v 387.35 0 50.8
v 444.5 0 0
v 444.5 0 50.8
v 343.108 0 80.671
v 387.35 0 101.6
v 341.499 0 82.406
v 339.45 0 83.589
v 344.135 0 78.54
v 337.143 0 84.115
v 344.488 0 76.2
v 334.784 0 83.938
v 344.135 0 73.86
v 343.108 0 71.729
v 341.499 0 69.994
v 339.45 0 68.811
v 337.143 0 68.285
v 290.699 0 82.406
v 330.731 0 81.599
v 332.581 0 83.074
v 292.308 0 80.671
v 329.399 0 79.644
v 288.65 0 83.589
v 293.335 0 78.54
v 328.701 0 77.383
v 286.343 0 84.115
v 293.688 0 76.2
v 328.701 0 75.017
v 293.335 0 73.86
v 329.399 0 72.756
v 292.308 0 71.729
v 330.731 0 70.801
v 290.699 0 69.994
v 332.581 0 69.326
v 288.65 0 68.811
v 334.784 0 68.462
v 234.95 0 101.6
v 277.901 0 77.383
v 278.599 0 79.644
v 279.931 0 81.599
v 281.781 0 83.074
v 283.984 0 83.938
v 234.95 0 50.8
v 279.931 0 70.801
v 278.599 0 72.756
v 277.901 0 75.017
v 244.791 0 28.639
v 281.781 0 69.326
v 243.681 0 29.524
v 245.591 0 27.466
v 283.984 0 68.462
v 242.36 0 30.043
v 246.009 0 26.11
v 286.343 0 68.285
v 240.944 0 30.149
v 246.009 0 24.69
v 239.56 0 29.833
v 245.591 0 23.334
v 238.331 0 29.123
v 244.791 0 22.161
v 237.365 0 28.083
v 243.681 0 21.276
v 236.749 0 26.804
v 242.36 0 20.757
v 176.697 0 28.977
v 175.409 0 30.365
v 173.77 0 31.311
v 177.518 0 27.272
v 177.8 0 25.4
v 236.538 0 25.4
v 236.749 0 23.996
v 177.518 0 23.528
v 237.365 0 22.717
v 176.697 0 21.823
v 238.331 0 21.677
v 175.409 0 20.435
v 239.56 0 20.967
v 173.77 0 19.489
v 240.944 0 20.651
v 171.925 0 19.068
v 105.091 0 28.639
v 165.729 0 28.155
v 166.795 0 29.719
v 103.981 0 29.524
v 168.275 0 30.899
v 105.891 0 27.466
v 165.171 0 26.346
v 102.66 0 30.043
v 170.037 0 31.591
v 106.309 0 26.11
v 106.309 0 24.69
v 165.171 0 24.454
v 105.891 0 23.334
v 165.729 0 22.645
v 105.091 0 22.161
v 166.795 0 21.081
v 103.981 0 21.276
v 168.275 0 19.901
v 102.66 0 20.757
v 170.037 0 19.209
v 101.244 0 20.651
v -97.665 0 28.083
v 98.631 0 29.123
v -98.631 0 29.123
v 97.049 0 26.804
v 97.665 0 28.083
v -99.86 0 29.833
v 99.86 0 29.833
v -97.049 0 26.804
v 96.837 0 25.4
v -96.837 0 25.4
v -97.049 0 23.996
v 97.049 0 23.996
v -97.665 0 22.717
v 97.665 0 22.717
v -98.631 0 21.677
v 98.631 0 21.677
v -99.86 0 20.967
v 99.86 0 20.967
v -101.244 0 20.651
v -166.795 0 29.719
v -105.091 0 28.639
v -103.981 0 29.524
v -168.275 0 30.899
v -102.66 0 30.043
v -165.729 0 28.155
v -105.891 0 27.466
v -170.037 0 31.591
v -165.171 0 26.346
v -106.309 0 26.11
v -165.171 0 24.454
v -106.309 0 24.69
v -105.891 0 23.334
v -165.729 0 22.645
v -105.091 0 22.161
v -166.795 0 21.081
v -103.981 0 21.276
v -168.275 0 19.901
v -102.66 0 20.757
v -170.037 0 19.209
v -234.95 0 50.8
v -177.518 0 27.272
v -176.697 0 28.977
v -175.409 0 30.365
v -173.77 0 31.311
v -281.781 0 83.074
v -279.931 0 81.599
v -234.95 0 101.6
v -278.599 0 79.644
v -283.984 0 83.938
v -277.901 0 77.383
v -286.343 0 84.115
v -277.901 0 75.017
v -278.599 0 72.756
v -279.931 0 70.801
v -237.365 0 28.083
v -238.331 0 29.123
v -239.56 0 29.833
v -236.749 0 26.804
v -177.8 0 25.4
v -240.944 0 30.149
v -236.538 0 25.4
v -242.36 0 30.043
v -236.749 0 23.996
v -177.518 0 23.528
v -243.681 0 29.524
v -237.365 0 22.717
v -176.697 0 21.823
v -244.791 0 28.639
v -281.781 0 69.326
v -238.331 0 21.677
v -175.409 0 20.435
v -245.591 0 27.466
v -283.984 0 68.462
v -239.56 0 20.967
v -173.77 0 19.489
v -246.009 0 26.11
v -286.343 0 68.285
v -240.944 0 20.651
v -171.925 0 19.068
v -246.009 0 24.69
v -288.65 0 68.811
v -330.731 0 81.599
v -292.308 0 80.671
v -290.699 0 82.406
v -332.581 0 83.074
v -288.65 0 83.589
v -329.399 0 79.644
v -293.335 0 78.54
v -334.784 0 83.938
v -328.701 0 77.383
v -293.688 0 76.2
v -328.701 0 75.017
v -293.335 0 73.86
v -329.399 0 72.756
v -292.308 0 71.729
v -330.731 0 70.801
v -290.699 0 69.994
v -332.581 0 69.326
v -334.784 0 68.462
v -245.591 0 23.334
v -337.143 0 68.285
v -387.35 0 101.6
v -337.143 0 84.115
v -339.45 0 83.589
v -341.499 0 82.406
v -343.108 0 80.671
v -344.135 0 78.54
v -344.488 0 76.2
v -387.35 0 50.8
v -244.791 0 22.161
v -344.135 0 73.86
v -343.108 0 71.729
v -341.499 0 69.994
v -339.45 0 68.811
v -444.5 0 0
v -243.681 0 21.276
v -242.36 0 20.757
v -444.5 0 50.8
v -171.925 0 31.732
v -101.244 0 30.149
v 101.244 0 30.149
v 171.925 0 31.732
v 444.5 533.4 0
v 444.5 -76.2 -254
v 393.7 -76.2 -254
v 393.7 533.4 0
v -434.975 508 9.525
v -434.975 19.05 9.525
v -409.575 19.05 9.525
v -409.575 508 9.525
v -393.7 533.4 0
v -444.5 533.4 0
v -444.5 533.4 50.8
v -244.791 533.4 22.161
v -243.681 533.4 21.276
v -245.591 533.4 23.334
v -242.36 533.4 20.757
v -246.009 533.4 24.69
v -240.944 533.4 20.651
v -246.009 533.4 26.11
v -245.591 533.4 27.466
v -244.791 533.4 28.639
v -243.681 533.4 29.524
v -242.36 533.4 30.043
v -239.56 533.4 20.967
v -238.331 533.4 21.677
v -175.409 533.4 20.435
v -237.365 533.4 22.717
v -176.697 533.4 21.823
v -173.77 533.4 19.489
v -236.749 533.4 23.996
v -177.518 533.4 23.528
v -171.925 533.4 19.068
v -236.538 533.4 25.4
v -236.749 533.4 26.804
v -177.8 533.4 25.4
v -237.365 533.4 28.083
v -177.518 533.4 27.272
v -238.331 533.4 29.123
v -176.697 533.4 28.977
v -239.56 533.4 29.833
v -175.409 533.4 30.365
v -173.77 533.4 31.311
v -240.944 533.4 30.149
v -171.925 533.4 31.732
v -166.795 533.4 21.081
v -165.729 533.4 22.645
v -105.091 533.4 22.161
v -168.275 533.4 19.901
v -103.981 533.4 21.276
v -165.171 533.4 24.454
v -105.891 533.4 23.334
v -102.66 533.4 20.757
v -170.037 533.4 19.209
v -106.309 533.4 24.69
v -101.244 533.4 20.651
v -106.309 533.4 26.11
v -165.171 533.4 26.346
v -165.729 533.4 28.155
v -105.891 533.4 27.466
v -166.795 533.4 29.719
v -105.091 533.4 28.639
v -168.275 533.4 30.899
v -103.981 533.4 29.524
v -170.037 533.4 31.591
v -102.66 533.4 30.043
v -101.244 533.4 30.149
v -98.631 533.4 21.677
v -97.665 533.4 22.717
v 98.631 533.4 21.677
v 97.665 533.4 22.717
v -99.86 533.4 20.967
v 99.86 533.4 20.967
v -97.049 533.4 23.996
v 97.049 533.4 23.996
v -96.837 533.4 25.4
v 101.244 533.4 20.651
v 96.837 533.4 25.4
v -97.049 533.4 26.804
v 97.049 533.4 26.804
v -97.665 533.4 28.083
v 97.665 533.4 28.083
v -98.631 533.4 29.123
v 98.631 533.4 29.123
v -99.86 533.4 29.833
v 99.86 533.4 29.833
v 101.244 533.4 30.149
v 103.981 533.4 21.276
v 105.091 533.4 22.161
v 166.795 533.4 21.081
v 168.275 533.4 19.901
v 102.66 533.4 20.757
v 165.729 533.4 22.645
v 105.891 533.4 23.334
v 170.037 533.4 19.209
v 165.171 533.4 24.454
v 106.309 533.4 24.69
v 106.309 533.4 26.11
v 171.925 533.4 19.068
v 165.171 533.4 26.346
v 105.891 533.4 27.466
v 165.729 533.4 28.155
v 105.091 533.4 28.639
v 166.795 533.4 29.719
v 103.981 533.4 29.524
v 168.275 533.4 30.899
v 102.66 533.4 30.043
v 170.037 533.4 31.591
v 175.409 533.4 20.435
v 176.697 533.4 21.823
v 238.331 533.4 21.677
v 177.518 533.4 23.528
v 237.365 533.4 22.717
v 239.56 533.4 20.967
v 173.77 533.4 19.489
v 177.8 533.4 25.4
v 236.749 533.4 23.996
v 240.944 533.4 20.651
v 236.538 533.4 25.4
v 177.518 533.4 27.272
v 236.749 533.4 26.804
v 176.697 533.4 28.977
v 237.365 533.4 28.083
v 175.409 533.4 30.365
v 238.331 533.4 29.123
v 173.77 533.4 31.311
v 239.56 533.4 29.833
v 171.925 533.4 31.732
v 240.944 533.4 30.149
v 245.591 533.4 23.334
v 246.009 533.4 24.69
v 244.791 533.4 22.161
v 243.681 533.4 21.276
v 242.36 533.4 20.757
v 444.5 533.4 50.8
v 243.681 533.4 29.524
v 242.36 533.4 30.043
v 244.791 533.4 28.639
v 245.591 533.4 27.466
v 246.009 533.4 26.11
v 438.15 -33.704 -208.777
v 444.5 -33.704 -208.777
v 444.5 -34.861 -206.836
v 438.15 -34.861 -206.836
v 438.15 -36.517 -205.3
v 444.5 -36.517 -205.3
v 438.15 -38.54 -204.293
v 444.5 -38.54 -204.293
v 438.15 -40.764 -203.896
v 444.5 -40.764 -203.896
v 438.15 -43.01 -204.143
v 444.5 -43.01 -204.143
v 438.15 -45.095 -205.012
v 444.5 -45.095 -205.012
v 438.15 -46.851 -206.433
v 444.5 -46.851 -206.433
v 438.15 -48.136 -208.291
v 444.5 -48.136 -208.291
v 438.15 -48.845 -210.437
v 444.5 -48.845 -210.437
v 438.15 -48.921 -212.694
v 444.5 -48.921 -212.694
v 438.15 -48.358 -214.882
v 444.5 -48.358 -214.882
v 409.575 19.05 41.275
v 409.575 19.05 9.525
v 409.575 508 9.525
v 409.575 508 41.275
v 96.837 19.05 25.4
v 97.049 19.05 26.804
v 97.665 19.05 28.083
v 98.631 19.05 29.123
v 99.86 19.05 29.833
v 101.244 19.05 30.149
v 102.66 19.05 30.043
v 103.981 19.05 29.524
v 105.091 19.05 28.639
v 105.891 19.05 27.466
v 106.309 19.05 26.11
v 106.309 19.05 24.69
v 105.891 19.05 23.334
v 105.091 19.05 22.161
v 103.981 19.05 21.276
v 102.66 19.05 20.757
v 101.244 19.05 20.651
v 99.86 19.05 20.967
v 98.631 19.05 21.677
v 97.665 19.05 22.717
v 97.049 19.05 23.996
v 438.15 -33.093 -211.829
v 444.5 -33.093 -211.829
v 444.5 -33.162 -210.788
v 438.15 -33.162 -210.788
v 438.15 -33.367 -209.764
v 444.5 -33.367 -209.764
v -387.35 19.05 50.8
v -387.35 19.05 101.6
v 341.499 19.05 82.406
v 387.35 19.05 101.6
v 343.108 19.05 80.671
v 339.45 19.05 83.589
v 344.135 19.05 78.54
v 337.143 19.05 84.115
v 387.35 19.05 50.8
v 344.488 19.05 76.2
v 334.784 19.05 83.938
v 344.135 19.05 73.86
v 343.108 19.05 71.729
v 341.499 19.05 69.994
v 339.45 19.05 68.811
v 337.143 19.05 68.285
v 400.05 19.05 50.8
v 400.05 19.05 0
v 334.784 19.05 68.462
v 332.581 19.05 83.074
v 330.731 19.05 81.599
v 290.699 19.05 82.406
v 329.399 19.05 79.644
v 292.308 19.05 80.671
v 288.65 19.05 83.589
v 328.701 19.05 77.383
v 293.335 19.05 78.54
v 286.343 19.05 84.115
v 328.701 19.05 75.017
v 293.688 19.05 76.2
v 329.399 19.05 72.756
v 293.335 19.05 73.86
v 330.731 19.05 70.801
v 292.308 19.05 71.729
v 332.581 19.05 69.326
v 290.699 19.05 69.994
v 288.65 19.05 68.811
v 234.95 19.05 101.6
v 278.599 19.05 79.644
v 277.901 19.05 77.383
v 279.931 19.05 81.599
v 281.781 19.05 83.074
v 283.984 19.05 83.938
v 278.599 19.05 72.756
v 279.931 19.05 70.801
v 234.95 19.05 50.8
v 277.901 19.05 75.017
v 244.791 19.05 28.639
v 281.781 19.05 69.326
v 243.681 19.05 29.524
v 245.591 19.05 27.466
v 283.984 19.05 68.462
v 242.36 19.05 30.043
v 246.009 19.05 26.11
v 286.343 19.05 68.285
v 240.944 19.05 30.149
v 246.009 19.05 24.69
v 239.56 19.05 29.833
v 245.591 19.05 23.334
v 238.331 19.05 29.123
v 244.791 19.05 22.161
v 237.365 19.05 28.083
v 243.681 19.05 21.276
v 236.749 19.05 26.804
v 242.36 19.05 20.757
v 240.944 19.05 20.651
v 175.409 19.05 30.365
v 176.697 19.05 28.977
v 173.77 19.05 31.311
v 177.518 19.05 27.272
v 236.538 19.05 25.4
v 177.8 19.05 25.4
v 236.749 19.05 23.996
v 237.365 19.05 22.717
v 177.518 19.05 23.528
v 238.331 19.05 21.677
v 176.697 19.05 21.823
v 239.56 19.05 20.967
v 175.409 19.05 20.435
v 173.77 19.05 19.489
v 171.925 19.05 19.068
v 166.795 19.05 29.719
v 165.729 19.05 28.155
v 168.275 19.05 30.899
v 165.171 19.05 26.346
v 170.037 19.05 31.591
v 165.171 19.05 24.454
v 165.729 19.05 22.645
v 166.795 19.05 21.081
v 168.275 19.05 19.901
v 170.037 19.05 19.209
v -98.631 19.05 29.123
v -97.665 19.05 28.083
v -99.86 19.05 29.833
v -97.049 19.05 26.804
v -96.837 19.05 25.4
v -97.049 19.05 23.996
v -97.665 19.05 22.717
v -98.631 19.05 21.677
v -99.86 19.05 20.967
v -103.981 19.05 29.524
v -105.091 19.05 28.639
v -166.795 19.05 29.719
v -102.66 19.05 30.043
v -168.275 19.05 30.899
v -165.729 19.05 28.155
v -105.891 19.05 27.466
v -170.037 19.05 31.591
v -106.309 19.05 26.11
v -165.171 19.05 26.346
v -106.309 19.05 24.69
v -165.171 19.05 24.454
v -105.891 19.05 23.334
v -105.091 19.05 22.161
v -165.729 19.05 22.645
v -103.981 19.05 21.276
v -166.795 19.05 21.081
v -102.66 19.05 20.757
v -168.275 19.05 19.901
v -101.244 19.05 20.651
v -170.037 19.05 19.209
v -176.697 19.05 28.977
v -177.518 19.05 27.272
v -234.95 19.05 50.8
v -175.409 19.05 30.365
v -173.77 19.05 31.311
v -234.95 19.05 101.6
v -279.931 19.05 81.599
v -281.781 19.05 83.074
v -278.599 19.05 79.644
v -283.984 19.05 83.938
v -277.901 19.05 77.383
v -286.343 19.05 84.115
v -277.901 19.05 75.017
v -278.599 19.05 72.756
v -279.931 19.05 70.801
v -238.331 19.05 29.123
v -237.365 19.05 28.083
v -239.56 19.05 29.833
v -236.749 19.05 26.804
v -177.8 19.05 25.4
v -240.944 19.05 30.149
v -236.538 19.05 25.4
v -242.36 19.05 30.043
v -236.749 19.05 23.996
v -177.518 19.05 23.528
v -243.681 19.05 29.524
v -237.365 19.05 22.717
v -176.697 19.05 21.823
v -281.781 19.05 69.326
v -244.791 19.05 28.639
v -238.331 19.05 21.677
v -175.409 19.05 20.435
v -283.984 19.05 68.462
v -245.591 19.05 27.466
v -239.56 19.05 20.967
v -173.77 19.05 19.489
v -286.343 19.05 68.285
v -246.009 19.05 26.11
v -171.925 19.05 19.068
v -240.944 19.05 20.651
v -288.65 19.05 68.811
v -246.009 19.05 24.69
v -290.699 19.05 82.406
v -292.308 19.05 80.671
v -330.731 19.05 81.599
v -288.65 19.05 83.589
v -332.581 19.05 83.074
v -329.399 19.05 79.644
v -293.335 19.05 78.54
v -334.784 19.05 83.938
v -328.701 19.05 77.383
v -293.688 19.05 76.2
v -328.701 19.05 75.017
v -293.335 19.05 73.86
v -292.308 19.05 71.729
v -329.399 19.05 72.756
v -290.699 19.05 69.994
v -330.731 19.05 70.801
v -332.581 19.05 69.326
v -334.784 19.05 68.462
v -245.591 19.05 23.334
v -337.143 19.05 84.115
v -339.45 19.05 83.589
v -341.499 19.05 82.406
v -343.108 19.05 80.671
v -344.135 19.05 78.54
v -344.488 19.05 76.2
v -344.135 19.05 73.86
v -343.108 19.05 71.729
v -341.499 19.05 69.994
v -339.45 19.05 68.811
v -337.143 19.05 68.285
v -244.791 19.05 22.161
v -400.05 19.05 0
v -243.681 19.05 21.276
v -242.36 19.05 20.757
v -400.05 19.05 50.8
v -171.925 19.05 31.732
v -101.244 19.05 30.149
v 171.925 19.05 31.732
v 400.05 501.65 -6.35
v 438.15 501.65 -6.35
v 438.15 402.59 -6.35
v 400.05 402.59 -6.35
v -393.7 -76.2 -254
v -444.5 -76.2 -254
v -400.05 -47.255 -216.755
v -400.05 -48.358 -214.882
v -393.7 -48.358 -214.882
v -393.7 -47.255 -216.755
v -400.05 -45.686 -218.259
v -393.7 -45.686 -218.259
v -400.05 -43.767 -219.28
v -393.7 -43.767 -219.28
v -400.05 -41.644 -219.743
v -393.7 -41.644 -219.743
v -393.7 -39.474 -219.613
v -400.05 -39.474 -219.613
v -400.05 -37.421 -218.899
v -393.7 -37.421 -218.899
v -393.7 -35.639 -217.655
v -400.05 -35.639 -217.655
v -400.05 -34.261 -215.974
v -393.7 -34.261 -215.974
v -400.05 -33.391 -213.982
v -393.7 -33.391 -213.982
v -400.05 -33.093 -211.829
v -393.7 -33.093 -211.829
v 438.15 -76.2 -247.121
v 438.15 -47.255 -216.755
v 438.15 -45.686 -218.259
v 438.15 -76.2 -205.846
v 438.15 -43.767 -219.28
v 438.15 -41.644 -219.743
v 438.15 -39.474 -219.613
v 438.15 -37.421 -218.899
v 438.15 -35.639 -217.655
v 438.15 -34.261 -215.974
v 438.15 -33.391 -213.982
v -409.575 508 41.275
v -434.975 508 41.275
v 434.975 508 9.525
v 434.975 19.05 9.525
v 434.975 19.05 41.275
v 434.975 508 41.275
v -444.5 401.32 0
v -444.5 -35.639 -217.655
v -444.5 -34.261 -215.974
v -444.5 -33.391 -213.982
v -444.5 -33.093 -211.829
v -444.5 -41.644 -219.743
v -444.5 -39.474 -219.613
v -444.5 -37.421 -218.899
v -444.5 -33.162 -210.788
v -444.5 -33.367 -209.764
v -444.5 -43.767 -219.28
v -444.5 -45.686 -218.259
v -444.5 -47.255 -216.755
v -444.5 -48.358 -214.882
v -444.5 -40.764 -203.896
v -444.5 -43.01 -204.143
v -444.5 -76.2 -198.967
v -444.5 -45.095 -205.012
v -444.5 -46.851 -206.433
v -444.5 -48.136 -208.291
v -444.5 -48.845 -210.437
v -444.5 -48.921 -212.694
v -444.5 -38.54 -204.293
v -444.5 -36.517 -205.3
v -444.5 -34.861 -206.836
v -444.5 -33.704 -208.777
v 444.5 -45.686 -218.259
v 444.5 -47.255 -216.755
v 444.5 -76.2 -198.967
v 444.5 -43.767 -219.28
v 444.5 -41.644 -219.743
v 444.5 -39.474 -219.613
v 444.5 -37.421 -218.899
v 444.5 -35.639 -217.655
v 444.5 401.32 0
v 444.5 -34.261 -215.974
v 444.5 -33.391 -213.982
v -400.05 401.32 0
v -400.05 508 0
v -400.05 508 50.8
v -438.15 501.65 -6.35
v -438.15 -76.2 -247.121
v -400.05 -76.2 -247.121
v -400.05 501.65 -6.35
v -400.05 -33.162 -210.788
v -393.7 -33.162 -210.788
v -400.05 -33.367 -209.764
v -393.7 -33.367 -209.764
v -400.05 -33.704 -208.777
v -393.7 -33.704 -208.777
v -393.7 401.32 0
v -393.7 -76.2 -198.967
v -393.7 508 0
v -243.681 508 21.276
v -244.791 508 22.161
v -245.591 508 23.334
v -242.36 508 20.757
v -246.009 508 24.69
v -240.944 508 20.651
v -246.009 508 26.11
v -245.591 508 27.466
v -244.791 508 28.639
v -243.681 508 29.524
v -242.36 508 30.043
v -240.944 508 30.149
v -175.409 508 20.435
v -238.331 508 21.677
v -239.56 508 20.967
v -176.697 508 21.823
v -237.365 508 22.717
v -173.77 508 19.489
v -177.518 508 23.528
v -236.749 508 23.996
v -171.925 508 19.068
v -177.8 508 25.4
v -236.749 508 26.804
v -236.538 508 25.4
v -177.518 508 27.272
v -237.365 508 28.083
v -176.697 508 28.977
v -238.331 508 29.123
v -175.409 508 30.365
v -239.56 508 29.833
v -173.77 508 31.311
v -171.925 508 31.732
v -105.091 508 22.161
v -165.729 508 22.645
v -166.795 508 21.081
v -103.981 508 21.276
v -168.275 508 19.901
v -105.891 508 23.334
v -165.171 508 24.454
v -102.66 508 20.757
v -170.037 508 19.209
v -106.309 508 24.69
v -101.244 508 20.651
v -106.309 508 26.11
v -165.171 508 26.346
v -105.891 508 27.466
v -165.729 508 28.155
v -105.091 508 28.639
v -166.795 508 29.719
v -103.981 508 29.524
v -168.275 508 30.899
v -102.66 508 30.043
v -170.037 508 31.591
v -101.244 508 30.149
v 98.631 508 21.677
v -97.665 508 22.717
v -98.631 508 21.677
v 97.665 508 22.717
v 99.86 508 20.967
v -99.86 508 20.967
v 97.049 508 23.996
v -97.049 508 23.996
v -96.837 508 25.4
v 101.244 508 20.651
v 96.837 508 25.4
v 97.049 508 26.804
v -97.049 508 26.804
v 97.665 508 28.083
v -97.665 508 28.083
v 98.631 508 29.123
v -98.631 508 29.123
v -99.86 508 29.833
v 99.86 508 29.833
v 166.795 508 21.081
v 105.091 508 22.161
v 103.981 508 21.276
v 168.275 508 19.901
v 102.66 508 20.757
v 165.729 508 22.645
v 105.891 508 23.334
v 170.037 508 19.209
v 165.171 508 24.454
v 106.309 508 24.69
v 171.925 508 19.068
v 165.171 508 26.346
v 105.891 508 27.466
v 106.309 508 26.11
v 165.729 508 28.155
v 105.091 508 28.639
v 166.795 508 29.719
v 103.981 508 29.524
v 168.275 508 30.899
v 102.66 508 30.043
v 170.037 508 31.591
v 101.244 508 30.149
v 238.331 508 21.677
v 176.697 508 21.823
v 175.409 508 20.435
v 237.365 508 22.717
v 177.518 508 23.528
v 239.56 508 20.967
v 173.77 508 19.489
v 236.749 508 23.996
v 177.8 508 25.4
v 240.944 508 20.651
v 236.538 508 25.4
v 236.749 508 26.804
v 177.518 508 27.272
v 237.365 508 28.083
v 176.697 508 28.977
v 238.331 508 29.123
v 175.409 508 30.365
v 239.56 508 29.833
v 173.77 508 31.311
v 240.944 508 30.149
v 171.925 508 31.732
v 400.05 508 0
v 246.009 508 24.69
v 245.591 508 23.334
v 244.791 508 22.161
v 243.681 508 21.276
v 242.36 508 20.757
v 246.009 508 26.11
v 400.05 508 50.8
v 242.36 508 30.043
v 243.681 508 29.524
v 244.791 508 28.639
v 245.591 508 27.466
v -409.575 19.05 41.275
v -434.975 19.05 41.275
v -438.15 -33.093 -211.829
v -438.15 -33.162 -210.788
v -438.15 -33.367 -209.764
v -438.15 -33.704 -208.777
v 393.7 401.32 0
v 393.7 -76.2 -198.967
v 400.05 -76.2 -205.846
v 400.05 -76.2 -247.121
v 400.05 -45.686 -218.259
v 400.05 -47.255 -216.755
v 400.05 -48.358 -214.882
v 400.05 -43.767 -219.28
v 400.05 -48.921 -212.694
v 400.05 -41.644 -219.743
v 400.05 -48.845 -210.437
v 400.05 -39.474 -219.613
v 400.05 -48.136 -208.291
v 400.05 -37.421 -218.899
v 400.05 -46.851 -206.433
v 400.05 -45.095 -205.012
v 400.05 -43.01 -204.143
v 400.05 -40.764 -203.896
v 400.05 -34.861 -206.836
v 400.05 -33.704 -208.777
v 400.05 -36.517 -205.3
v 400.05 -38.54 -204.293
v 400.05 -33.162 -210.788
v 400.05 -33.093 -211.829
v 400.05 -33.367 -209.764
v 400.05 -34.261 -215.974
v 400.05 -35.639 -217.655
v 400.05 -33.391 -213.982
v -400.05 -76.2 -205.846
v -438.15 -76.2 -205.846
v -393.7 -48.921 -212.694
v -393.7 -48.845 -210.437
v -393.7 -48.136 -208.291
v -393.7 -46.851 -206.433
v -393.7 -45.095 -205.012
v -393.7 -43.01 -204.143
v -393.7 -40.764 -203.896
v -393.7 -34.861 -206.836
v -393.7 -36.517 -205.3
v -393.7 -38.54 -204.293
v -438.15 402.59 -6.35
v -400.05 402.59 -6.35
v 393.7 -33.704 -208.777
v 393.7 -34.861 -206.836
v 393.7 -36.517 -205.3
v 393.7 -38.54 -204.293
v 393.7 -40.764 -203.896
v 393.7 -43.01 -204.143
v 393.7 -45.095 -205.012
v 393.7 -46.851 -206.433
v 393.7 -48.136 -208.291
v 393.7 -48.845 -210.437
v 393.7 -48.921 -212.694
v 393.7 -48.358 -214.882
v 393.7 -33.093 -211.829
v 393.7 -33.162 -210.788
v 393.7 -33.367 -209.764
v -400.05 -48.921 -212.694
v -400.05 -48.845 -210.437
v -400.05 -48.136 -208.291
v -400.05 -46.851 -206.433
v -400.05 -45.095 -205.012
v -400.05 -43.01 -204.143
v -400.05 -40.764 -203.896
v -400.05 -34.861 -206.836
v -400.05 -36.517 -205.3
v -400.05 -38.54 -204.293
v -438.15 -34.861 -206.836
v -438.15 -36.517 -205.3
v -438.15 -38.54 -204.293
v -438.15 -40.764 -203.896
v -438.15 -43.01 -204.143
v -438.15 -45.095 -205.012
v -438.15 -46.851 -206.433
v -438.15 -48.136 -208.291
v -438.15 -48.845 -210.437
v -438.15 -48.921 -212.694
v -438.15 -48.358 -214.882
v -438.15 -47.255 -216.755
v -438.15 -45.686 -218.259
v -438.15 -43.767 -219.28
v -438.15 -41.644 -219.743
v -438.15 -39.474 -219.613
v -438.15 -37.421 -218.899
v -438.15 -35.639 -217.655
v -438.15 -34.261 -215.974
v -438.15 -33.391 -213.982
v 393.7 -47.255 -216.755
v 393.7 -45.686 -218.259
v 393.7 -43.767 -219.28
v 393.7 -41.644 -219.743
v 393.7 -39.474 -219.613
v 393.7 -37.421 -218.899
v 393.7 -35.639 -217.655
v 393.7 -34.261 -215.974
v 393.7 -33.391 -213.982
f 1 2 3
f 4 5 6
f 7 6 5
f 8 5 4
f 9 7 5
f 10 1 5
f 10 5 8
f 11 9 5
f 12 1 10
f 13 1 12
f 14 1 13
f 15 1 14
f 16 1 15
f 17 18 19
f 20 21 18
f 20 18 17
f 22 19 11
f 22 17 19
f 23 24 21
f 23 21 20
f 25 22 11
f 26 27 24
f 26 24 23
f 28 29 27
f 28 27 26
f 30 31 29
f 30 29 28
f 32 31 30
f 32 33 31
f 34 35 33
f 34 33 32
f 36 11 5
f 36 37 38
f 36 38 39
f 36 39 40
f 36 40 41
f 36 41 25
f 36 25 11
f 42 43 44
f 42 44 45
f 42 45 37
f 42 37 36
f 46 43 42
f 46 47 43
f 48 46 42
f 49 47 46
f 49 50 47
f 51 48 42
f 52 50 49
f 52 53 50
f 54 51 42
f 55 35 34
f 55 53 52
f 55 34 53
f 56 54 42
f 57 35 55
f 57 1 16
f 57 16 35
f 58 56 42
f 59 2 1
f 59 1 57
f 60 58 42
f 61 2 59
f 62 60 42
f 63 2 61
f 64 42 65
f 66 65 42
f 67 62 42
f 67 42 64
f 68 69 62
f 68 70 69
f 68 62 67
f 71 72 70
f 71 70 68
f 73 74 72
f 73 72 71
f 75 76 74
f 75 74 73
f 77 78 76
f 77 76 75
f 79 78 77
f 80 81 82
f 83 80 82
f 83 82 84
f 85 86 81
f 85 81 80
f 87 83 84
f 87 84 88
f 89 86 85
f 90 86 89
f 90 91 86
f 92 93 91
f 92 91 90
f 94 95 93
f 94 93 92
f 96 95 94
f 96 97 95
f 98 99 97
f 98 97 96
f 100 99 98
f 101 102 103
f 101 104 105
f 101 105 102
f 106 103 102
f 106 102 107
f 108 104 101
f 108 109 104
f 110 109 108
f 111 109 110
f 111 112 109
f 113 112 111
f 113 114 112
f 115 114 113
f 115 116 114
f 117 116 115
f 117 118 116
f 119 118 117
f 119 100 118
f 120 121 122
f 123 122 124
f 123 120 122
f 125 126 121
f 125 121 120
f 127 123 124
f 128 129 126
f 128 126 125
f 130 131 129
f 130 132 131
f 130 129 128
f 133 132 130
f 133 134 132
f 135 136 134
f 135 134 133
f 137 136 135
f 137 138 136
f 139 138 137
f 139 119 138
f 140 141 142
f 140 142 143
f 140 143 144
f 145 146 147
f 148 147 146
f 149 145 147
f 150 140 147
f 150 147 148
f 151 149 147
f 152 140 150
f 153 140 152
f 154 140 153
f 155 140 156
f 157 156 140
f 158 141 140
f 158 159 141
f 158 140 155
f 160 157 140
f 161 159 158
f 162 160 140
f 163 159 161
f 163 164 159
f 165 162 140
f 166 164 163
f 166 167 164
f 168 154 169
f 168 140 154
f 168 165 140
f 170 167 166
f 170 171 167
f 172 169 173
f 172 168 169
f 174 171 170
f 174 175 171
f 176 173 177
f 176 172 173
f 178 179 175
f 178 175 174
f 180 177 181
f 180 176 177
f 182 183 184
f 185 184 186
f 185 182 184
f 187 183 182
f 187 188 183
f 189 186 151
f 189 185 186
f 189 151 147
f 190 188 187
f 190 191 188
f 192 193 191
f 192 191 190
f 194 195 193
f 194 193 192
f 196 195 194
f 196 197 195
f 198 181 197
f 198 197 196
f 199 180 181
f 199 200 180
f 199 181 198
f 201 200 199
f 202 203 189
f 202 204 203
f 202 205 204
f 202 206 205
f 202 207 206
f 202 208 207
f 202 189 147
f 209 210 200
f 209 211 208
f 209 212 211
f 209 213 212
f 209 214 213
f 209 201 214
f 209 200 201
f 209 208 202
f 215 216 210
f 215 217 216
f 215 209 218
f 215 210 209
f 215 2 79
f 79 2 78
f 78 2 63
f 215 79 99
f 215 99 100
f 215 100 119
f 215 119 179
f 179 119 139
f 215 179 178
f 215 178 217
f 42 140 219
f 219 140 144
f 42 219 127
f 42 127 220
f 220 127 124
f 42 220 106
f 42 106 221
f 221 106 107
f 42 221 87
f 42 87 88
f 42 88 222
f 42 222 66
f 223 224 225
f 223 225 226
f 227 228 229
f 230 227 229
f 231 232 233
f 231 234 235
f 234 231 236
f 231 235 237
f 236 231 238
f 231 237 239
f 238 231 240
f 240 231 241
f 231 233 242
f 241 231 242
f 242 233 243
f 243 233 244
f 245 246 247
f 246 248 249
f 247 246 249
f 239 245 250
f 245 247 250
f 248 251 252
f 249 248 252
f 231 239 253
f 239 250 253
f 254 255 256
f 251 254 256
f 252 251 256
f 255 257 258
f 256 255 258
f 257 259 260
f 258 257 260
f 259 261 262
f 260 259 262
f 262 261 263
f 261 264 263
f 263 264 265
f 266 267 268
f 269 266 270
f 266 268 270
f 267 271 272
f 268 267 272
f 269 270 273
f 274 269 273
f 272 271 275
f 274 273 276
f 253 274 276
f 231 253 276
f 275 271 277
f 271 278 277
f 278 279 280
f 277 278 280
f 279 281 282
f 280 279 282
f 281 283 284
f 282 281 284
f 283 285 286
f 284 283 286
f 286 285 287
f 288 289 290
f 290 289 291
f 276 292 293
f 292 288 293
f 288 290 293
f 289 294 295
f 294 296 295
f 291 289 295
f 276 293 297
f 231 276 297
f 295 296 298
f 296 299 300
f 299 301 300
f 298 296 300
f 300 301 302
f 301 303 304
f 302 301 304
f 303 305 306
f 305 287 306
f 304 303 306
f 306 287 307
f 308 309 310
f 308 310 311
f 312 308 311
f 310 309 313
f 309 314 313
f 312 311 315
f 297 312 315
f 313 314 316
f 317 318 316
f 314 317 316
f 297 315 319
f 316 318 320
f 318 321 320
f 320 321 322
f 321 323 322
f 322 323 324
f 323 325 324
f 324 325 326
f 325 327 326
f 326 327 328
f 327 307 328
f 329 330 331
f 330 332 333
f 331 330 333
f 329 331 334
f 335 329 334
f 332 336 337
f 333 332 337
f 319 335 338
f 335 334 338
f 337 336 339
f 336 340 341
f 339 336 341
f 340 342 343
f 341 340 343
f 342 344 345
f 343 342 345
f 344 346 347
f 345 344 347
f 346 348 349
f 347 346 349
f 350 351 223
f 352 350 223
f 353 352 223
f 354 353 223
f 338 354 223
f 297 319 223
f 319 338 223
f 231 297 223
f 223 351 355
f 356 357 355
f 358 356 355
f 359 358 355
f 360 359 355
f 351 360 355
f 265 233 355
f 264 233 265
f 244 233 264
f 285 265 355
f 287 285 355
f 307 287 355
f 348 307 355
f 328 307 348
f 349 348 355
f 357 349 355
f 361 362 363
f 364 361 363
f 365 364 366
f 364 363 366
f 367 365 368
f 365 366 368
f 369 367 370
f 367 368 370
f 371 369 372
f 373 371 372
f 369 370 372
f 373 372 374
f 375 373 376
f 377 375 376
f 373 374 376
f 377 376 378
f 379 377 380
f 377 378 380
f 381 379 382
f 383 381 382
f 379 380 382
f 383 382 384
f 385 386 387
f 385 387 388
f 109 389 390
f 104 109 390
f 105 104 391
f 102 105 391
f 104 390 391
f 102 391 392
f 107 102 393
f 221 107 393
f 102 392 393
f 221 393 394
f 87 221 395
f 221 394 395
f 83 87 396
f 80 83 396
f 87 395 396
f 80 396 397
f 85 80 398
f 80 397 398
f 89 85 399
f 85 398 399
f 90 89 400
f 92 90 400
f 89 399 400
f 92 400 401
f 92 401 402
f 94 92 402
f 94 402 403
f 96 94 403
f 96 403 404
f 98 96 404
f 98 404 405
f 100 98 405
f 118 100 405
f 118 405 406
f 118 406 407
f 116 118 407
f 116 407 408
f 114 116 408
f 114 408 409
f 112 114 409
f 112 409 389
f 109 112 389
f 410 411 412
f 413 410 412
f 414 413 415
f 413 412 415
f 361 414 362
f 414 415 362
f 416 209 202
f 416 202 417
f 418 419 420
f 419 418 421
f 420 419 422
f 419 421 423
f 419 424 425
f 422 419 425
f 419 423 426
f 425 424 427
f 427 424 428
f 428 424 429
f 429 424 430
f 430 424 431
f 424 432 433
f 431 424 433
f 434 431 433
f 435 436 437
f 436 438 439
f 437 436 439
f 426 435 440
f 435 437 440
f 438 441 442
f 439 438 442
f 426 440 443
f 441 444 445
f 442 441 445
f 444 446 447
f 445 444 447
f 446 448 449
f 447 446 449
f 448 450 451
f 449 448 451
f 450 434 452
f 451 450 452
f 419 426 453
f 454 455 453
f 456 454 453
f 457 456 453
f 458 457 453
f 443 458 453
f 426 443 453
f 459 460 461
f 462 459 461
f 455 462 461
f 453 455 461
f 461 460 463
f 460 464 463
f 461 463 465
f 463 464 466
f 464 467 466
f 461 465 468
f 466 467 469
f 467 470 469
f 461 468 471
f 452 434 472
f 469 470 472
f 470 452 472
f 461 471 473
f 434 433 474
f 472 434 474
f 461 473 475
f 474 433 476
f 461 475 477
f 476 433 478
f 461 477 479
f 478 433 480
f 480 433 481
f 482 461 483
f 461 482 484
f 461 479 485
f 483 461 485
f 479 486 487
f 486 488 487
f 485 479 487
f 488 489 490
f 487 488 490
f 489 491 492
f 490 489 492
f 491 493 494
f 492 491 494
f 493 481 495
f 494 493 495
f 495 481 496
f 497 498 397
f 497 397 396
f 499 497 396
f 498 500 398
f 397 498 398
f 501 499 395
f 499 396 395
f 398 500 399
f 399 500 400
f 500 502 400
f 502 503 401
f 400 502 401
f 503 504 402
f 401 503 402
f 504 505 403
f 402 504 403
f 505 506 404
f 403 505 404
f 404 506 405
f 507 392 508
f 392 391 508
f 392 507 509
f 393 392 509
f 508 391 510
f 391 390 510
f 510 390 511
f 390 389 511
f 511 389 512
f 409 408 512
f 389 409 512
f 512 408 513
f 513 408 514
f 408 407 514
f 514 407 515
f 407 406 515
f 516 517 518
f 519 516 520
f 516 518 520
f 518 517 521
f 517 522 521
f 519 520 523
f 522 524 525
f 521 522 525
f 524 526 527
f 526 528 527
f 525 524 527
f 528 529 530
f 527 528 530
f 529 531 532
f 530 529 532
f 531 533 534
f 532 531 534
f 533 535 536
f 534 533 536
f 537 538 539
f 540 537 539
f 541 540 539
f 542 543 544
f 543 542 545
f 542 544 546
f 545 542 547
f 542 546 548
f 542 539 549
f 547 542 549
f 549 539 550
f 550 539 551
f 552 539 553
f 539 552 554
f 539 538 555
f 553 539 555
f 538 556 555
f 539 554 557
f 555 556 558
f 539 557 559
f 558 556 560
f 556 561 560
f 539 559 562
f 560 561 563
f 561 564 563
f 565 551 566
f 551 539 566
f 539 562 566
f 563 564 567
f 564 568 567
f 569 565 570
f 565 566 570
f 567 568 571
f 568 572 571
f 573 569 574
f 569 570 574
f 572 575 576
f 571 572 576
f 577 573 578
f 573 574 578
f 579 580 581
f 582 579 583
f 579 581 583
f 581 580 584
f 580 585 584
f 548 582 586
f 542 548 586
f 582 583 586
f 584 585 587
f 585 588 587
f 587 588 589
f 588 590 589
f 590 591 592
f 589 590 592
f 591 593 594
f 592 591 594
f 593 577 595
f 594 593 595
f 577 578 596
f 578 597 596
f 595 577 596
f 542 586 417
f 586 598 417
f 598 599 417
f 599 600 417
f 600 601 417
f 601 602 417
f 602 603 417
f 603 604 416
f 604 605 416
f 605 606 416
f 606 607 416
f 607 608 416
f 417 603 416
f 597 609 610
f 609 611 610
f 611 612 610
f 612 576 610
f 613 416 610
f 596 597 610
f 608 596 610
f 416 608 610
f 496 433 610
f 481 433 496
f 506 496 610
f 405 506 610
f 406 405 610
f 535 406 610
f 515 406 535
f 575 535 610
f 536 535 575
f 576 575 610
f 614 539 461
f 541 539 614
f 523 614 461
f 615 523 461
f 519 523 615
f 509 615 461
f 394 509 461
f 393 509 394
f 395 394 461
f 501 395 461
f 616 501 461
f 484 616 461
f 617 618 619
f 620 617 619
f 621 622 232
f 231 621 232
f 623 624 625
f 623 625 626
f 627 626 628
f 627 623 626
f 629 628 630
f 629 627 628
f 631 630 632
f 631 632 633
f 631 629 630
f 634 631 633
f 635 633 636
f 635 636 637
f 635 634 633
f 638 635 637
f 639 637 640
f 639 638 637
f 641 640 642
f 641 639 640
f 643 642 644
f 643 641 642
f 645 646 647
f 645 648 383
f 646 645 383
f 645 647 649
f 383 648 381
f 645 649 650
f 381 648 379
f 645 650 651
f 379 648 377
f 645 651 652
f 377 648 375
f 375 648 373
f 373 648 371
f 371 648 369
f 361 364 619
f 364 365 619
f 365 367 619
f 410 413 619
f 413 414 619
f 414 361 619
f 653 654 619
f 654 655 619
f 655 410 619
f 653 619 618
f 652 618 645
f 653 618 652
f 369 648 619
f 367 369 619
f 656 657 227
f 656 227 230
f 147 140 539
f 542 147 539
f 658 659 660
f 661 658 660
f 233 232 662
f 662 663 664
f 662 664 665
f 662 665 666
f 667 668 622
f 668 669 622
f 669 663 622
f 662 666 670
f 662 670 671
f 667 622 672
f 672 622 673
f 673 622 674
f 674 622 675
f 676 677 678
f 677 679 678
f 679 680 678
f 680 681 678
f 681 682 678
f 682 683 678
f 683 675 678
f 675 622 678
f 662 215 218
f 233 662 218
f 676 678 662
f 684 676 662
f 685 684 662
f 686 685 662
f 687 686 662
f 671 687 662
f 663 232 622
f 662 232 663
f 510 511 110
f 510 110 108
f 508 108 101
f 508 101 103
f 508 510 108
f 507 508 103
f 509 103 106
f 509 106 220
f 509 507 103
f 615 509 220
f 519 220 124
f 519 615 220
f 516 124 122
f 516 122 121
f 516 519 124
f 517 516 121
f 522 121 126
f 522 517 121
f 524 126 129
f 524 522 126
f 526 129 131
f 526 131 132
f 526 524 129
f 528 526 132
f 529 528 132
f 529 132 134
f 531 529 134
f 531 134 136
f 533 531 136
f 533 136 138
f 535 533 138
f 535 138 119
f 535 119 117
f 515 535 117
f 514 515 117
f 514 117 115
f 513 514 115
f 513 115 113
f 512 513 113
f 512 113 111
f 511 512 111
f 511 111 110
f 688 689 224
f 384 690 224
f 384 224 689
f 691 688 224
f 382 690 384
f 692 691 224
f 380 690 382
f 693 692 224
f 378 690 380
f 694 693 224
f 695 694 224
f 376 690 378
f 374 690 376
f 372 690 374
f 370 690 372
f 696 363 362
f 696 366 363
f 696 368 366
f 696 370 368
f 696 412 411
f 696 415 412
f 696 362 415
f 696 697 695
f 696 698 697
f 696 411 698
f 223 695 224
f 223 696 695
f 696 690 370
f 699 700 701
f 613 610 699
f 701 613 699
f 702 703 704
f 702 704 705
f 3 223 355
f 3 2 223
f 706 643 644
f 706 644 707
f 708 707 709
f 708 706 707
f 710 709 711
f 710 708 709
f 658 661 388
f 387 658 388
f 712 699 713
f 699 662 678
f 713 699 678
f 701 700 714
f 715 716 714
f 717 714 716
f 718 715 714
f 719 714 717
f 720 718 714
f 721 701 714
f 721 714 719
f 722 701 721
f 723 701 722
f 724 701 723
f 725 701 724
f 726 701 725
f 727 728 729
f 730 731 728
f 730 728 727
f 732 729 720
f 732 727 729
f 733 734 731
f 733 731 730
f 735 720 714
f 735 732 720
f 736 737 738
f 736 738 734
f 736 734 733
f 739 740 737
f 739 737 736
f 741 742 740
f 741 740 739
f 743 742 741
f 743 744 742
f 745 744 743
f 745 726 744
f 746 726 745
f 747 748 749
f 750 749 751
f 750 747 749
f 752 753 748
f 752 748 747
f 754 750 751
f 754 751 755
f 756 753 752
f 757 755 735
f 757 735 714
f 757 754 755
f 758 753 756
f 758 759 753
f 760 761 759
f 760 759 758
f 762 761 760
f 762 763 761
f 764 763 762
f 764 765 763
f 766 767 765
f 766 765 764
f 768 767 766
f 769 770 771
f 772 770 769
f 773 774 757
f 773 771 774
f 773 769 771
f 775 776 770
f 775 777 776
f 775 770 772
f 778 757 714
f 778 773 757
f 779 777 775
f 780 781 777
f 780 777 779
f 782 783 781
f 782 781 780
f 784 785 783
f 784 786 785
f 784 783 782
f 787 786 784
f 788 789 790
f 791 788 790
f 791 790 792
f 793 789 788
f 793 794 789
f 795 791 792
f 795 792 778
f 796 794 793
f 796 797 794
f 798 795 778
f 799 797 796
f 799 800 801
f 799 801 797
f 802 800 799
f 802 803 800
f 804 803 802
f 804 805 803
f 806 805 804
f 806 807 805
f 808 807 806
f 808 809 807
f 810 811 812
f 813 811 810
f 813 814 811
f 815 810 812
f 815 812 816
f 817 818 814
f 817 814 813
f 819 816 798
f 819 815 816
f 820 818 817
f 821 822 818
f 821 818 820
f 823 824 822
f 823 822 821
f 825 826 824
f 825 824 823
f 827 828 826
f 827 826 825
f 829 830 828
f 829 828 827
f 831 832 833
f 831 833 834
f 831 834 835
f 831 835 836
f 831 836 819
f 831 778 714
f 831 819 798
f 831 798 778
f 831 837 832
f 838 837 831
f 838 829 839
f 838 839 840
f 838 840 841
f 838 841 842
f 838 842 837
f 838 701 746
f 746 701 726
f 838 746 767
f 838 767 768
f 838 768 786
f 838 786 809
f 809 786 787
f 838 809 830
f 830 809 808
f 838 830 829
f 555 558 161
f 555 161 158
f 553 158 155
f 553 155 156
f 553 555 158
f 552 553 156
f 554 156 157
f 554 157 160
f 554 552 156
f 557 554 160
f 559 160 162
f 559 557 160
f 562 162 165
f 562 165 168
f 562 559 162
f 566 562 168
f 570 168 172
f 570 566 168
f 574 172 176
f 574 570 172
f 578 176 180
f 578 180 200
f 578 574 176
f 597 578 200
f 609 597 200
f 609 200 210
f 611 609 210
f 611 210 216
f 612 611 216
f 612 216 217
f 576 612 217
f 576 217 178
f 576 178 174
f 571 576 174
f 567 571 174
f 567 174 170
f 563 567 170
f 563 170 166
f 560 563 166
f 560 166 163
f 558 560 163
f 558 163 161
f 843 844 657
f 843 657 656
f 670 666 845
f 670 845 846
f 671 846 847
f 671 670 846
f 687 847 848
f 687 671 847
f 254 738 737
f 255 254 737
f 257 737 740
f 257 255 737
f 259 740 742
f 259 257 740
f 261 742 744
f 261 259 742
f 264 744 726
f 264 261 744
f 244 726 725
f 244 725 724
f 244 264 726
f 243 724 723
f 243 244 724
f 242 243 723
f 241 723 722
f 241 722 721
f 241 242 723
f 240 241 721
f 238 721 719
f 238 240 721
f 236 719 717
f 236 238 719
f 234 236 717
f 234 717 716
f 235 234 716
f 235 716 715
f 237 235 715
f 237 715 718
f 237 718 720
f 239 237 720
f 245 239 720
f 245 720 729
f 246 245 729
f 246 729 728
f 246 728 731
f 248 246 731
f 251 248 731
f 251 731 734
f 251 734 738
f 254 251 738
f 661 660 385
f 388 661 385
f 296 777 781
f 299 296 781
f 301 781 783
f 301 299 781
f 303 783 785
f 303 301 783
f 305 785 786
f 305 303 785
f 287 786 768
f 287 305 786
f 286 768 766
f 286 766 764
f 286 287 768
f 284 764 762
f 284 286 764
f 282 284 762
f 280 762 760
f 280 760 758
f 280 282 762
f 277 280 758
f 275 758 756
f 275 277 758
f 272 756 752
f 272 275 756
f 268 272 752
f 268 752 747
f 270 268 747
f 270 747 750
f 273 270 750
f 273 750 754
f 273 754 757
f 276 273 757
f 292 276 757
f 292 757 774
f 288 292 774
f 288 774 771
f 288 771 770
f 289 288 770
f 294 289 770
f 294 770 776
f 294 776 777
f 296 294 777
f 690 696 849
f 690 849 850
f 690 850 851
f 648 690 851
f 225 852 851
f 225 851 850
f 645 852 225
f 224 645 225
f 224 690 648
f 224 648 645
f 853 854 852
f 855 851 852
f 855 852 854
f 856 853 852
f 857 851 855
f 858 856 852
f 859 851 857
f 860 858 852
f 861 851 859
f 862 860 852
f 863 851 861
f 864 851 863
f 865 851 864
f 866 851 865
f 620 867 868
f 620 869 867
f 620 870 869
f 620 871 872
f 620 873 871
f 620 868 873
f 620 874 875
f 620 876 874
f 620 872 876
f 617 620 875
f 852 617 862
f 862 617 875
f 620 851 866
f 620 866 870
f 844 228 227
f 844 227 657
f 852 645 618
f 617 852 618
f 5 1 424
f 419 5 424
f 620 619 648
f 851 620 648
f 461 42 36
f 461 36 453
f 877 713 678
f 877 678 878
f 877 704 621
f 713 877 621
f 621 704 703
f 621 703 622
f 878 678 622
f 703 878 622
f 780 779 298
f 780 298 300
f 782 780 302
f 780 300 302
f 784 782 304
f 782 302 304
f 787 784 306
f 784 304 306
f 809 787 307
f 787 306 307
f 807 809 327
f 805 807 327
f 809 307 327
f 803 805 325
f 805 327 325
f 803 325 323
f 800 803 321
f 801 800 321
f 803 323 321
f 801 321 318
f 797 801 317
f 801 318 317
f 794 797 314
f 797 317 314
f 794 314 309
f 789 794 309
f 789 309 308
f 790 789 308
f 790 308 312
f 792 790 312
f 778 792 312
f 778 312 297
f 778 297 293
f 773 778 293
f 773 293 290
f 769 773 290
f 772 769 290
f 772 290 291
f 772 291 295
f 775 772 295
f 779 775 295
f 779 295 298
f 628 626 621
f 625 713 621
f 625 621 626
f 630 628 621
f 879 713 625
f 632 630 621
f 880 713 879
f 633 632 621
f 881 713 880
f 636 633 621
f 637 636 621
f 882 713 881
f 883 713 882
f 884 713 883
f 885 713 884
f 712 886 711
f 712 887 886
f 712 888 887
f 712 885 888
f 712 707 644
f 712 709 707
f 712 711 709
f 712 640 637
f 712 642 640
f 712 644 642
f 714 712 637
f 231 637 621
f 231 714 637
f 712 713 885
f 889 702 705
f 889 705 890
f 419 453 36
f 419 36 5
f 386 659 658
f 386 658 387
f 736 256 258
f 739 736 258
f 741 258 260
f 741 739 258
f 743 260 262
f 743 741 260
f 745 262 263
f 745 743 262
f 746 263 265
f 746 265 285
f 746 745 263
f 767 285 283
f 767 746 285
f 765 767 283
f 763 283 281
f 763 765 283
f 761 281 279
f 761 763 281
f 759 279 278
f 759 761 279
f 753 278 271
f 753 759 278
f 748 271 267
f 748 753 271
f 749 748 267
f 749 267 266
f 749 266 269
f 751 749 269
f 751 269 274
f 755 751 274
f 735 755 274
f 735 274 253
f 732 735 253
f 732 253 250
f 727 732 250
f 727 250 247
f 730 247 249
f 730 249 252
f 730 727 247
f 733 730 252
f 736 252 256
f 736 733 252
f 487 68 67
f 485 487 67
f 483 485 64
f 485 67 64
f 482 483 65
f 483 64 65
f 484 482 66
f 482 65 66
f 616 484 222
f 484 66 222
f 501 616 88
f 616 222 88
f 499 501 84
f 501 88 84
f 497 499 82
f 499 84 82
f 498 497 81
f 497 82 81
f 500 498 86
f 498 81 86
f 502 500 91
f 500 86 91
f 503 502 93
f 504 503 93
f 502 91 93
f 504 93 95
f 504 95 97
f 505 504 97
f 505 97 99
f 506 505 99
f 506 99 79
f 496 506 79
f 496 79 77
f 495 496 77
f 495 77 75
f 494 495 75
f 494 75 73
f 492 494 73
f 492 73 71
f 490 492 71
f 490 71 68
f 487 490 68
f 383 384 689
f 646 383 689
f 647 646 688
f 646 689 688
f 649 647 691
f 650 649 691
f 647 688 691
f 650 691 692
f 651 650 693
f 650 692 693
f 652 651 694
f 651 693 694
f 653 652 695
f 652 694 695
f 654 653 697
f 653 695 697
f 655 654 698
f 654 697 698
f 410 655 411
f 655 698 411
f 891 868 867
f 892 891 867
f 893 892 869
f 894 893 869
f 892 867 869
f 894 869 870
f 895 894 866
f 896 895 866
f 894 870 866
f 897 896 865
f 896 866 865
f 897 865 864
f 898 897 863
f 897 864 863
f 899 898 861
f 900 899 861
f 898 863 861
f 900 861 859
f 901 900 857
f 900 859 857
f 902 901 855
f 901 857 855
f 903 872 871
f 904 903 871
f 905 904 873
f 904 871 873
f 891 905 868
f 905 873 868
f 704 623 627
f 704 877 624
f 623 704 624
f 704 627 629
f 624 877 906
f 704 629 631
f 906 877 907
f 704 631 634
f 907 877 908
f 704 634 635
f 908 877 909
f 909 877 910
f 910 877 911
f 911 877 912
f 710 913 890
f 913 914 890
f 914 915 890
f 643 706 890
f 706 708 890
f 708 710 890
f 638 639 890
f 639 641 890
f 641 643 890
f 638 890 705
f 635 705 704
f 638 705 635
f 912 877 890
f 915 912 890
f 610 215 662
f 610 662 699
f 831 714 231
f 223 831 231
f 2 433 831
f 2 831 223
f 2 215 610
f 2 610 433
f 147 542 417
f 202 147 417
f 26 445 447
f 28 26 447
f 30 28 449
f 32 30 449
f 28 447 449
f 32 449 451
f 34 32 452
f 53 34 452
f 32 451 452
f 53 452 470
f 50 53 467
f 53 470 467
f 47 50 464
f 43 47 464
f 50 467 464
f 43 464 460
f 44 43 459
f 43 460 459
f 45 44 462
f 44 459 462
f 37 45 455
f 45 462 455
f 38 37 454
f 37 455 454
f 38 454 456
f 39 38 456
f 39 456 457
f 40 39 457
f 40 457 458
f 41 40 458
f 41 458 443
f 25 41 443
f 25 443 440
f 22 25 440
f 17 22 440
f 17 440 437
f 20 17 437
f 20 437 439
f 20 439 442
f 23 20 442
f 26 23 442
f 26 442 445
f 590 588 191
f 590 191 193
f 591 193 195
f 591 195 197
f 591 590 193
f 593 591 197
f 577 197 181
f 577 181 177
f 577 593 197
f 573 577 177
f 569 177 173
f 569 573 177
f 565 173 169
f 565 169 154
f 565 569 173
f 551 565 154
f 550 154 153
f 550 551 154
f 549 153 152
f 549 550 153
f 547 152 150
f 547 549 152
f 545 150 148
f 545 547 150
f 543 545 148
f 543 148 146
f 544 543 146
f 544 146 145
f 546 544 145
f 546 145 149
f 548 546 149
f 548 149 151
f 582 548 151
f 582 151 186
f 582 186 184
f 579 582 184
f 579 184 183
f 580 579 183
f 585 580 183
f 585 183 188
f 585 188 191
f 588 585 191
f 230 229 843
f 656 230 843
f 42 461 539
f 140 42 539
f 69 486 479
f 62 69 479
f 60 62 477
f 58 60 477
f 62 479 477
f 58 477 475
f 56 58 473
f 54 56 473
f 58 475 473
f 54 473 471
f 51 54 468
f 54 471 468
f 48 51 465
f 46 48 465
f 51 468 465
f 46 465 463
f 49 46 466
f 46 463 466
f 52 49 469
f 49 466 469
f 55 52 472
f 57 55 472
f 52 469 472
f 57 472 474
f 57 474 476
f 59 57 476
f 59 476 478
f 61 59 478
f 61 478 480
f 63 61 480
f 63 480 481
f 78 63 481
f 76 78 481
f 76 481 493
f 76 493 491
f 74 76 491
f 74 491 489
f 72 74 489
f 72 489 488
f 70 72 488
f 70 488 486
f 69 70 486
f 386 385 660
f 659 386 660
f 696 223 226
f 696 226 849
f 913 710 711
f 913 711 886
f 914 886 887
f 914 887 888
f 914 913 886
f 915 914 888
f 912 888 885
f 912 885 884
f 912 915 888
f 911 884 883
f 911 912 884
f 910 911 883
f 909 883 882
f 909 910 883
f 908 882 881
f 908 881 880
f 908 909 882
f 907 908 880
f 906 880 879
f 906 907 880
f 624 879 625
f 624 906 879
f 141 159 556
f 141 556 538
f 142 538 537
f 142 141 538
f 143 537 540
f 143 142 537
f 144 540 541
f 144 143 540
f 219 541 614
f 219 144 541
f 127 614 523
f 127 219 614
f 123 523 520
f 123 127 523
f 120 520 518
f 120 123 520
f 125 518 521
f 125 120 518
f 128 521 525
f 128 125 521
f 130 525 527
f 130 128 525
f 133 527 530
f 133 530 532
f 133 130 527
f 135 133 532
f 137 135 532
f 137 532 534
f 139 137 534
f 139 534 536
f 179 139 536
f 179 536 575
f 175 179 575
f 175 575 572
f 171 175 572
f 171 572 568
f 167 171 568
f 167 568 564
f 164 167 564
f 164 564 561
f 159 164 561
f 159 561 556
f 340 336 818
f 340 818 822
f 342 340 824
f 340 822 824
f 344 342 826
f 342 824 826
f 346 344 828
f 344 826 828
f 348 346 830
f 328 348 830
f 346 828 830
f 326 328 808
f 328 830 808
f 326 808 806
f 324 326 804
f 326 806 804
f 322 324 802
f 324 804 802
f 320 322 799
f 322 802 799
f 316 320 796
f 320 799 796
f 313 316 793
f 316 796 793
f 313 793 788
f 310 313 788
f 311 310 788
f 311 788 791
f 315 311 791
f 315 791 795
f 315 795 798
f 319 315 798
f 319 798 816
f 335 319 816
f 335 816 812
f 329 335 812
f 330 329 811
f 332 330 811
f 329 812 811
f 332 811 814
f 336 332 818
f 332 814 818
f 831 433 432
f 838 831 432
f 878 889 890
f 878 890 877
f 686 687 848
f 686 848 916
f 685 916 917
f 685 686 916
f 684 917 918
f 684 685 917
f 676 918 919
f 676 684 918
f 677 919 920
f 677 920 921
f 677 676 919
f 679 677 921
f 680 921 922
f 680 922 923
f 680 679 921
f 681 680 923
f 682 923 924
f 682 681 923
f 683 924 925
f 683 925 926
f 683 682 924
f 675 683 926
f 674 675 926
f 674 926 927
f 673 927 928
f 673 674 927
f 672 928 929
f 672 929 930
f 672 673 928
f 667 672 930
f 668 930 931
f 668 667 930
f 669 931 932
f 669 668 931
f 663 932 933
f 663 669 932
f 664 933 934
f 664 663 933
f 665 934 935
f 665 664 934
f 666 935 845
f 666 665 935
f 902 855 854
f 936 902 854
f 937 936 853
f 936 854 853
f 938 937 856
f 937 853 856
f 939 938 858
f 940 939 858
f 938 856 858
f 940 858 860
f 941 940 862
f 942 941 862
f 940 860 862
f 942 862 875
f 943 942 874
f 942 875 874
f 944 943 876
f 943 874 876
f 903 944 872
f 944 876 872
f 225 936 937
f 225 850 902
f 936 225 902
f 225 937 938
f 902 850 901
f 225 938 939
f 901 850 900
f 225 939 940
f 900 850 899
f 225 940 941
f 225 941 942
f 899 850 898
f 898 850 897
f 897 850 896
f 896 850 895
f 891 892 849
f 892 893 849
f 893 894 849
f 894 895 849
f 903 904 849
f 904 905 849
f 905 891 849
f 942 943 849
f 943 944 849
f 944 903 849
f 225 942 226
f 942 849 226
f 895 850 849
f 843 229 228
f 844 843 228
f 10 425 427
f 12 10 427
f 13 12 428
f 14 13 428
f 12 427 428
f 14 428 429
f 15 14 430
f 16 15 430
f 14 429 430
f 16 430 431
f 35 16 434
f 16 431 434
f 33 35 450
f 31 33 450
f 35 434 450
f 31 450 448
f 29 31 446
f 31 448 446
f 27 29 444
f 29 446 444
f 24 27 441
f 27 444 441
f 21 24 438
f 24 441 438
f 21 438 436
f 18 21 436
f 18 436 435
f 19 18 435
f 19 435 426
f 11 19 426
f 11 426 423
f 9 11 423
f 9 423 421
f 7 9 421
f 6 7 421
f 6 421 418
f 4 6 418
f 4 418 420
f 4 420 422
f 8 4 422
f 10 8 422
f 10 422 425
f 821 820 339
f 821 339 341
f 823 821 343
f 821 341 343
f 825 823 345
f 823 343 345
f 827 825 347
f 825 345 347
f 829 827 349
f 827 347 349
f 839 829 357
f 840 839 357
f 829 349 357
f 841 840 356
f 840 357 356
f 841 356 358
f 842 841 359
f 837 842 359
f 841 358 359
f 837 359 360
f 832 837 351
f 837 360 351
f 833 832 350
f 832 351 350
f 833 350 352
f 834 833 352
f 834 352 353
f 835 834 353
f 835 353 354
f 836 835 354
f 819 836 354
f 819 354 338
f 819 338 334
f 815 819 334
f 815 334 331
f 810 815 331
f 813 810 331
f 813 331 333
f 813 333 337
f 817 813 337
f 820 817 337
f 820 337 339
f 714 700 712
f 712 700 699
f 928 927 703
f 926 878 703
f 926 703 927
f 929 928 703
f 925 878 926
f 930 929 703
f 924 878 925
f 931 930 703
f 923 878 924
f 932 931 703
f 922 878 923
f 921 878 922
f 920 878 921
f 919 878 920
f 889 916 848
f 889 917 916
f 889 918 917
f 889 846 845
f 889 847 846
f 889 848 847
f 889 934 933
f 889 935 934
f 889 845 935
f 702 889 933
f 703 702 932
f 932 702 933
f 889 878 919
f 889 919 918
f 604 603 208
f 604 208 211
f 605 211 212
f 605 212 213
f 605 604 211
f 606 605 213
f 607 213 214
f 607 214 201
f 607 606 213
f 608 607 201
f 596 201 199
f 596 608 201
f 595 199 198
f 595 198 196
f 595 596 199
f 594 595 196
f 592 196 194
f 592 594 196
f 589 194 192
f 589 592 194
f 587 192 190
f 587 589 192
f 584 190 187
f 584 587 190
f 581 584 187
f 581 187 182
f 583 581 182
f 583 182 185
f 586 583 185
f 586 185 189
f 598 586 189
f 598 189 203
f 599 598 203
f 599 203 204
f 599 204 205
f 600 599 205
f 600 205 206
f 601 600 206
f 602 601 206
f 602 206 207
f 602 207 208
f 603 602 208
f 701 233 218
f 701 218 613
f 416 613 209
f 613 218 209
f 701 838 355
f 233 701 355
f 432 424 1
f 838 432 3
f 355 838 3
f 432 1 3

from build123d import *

# Parameters (mm, degrees)
F0_W      = 444.5
F0_H      = 19.05
F1_DEPTH  = 50.8
F2_W      = 152.4
F2_H      = 19.05
F3_DEPTH  = 50.8
F4_W      = 44.45
F4_H      = 50.8
F4_W_2    = 25.4
F4_H_2    = 31.75
F5_DEPTH  = 488.95
F6_W      = 444.5
F6_H      = 50.8
F7_DEPTH  = 25.4
F9_DEPTH  = 25.4
F10_R     = 6.35
F11_DEPTH = 25.4
F13_DEPTH = 50.8
F14_T     = -6.35
F16_DEPTH = 444.501
F17_DEPTH = 444.501
F19_R     = 6.35
F20_DEPTH = 25.4
F18_R     = 4.7625
F21_DEPTH = 609.601


with BuildPart() as f1:
    # F0 (on Top) → F1 (new body)
    with BuildSketch(Plane.XY):
        with Locations((222.25, 9.525)):
            Rectangle(F0_W, F0_H)
    extrude(amount=F1_DEPTH)

    # F2 (on face) → F3 (join)
    with BuildSketch(Plane.XY.offset(50.8)):
        with Locations((311.15, 9.525)):
            Rectangle(F2_W, F2_H)
    extrude(amount=F3_DEPTH)

    # F4 (on face) → F5 (join)
    with BuildSketch(Plane(origin=(0, 19.05, 0), x_dir=(-1, 0, 0), z_dir=(0, 1, 0))):
        with Locations((-422.275, 25.4)):
            Rectangle(F4_W, F4_H)
        with Locations((-422.275, 25.4)):
            Rectangle(F4_W_2, F4_H_2, mode=Mode.SUBTRACT)
    extrude(amount=F5_DEPTH)

    # F6 (on face) → F7 (join)
    with BuildSketch(Plane(origin=(0, 508, 0), x_dir=(-1, 0, 0), z_dir=(0, 1, 0))):
        with Locations((-222.25, 25.4)):
            Rectangle(F6_W, F6_H)
    extrude(amount=F7_DEPTH)

    # F8 (on face) → F9 (cut)
    with BuildSketch(Plane(origin=(0, 19.05, 0), x_dir=(-1, 0, 0), z_dir=(0, 1, 0))):
        with BuildLine():
            ThreePointArc((-328.6125, 76.2), (-336.55, 84.1375), (-344.4875, 76.2))
            Line((-344.4875, 76.2), (-336.55, 76.2))
            Line((-336.55, 76.2), (-328.6125, 76.2))
        make_face()
        with BuildLine():
            ThreePointArc((-277.8125, 76.2), (-285.75, 84.1375), (-293.6875, 76.2))
            ThreePointArc((-293.6875, 76.2), (-285.75, 68.2625), (-277.8125, 76.2))
        make_face()
        with BuildLine():
            Line((-336.55, 76.2), (-344.4875, 76.2))
            ThreePointArc((-344.4875, 76.2), (-336.55, 68.2625), (-328.6125, 76.2))
            Line((-328.6125, 76.2), (-336.55, 76.2))
        make_face()
    extrude(amount=-F9_DEPTH, mode=Mode.SUBTRACT)

    # F10 (on face) → F11 (cut)
    with BuildSketch(Plane.XZ):
        with Locations((171.45, 25.4)):
            Circle(F10_R)
    extrude(amount=-F11_DEPTH, mode=Mode.SUBTRACT)

    # F15 (on face) → F17 (cut, through all)
    with BuildSketch(Plane.YZ.offset(444.5)):
        with BuildLine():
            ThreePointArc((-33.7038461538, -208.7766025641), (-44.0836538462, -204.5025641026), (-48.3576923077, -214.8823717949))
            Line((-48.3576923077, -214.8823717949), (-33.7038461538, -208.7766025641))
        make_face()
        with BuildLine():
            Line((-33.7038461538, -208.7766025641), (-48.3576923077, -214.8823717949))
            ThreePointArc((-48.3576923077, -214.8823717949), (-39.4740974081, -219.6128462928), (-33.0932692308, -211.8294871795))
            ThreePointArc((-33.0932692308, -211.8294871795), (-33.2474101175, -210.2728153568), (-33.7038461538, -208.7766025641))
        make_face()
    extrude(amount=-F17_DEPTH, mode=Mode.SUBTRACT)

    # F19 (on face) → F20 (cut)
    with BuildSketch(Plane.XZ.offset(-508)):
        with Locations((171.45, 25.4)):
            Circle(F19_R)
    extrude(amount=-F20_DEPTH, mode=Mode.SUBTRACT)

    # F18 (on face) → F21 (cut, through all)
    with BuildSketch(Plane(origin=(0, 533.4, 0), x_dir=(-1, 0, 0), z_dir=(0, 1, 0))):
        with Locations((-241.3, 25.4)):
            Circle(F18_R)
        with Locations((-101.6, 25.4)):
            Circle(F18_R)
    extrude(amount=-F21_DEPTH, mode=Mode.SUBTRACT)



with BuildPart() as f13:
    # F12 (on face) → F13 (new body)
    with BuildSketch(Plane.YZ.offset(444.5)):
        Polygon((401.32, 0), (-76.2, -198.9666666667), (-76.2, -254), (533.4, 0), align=None)
    extrude(amount=-F13_DEPTH)

    # F14
    f14_openings = [f13.faces().sort_by_distance(p)[0] for p in [
        (419.1, -76.2, -226.483333),
    ]]
    offset(amount=F14_T, openings=f14_openings)

    # F15 (on face) → F16 (cut, through all)
    with BuildSketch(Plane.YZ.offset(444.5)):
        with BuildLine():
            ThreePointArc((-33.7038461538, -208.7766025641), (-44.0836538462, -204.5025641026), (-48.3576923077, -214.8823717949))
            Line((-48.3576923077, -214.8823717949), (-33.7038461538, -208.7766025641))
        make_face()
        with BuildLine():
            Line((-33.7038461538, -208.7766025641), (-48.3576923077, -214.8823717949))
            ThreePointArc((-48.3576923077, -214.8823717949), (-39.4740974081, -219.6128462928), (-33.0932692308, -211.8294871795))
            ThreePointArc((-33.0932692308, -211.8294871795), (-33.2474101175, -210.2728153568), (-33.7038461538, -208.7766025641))
        make_face()
    extrude(amount=-F16_DEPTH, mode=Mode.SUBTRACT)


with BuildPart() as f1_1:
    add(f1.part)
    # F22: F13, F1 across plane
    add(f13.part.mirror(Plane.YZ))
    add(f1.part.mirror(Plane.YZ))


solid = Compound([f13.part, f1_1.part])
